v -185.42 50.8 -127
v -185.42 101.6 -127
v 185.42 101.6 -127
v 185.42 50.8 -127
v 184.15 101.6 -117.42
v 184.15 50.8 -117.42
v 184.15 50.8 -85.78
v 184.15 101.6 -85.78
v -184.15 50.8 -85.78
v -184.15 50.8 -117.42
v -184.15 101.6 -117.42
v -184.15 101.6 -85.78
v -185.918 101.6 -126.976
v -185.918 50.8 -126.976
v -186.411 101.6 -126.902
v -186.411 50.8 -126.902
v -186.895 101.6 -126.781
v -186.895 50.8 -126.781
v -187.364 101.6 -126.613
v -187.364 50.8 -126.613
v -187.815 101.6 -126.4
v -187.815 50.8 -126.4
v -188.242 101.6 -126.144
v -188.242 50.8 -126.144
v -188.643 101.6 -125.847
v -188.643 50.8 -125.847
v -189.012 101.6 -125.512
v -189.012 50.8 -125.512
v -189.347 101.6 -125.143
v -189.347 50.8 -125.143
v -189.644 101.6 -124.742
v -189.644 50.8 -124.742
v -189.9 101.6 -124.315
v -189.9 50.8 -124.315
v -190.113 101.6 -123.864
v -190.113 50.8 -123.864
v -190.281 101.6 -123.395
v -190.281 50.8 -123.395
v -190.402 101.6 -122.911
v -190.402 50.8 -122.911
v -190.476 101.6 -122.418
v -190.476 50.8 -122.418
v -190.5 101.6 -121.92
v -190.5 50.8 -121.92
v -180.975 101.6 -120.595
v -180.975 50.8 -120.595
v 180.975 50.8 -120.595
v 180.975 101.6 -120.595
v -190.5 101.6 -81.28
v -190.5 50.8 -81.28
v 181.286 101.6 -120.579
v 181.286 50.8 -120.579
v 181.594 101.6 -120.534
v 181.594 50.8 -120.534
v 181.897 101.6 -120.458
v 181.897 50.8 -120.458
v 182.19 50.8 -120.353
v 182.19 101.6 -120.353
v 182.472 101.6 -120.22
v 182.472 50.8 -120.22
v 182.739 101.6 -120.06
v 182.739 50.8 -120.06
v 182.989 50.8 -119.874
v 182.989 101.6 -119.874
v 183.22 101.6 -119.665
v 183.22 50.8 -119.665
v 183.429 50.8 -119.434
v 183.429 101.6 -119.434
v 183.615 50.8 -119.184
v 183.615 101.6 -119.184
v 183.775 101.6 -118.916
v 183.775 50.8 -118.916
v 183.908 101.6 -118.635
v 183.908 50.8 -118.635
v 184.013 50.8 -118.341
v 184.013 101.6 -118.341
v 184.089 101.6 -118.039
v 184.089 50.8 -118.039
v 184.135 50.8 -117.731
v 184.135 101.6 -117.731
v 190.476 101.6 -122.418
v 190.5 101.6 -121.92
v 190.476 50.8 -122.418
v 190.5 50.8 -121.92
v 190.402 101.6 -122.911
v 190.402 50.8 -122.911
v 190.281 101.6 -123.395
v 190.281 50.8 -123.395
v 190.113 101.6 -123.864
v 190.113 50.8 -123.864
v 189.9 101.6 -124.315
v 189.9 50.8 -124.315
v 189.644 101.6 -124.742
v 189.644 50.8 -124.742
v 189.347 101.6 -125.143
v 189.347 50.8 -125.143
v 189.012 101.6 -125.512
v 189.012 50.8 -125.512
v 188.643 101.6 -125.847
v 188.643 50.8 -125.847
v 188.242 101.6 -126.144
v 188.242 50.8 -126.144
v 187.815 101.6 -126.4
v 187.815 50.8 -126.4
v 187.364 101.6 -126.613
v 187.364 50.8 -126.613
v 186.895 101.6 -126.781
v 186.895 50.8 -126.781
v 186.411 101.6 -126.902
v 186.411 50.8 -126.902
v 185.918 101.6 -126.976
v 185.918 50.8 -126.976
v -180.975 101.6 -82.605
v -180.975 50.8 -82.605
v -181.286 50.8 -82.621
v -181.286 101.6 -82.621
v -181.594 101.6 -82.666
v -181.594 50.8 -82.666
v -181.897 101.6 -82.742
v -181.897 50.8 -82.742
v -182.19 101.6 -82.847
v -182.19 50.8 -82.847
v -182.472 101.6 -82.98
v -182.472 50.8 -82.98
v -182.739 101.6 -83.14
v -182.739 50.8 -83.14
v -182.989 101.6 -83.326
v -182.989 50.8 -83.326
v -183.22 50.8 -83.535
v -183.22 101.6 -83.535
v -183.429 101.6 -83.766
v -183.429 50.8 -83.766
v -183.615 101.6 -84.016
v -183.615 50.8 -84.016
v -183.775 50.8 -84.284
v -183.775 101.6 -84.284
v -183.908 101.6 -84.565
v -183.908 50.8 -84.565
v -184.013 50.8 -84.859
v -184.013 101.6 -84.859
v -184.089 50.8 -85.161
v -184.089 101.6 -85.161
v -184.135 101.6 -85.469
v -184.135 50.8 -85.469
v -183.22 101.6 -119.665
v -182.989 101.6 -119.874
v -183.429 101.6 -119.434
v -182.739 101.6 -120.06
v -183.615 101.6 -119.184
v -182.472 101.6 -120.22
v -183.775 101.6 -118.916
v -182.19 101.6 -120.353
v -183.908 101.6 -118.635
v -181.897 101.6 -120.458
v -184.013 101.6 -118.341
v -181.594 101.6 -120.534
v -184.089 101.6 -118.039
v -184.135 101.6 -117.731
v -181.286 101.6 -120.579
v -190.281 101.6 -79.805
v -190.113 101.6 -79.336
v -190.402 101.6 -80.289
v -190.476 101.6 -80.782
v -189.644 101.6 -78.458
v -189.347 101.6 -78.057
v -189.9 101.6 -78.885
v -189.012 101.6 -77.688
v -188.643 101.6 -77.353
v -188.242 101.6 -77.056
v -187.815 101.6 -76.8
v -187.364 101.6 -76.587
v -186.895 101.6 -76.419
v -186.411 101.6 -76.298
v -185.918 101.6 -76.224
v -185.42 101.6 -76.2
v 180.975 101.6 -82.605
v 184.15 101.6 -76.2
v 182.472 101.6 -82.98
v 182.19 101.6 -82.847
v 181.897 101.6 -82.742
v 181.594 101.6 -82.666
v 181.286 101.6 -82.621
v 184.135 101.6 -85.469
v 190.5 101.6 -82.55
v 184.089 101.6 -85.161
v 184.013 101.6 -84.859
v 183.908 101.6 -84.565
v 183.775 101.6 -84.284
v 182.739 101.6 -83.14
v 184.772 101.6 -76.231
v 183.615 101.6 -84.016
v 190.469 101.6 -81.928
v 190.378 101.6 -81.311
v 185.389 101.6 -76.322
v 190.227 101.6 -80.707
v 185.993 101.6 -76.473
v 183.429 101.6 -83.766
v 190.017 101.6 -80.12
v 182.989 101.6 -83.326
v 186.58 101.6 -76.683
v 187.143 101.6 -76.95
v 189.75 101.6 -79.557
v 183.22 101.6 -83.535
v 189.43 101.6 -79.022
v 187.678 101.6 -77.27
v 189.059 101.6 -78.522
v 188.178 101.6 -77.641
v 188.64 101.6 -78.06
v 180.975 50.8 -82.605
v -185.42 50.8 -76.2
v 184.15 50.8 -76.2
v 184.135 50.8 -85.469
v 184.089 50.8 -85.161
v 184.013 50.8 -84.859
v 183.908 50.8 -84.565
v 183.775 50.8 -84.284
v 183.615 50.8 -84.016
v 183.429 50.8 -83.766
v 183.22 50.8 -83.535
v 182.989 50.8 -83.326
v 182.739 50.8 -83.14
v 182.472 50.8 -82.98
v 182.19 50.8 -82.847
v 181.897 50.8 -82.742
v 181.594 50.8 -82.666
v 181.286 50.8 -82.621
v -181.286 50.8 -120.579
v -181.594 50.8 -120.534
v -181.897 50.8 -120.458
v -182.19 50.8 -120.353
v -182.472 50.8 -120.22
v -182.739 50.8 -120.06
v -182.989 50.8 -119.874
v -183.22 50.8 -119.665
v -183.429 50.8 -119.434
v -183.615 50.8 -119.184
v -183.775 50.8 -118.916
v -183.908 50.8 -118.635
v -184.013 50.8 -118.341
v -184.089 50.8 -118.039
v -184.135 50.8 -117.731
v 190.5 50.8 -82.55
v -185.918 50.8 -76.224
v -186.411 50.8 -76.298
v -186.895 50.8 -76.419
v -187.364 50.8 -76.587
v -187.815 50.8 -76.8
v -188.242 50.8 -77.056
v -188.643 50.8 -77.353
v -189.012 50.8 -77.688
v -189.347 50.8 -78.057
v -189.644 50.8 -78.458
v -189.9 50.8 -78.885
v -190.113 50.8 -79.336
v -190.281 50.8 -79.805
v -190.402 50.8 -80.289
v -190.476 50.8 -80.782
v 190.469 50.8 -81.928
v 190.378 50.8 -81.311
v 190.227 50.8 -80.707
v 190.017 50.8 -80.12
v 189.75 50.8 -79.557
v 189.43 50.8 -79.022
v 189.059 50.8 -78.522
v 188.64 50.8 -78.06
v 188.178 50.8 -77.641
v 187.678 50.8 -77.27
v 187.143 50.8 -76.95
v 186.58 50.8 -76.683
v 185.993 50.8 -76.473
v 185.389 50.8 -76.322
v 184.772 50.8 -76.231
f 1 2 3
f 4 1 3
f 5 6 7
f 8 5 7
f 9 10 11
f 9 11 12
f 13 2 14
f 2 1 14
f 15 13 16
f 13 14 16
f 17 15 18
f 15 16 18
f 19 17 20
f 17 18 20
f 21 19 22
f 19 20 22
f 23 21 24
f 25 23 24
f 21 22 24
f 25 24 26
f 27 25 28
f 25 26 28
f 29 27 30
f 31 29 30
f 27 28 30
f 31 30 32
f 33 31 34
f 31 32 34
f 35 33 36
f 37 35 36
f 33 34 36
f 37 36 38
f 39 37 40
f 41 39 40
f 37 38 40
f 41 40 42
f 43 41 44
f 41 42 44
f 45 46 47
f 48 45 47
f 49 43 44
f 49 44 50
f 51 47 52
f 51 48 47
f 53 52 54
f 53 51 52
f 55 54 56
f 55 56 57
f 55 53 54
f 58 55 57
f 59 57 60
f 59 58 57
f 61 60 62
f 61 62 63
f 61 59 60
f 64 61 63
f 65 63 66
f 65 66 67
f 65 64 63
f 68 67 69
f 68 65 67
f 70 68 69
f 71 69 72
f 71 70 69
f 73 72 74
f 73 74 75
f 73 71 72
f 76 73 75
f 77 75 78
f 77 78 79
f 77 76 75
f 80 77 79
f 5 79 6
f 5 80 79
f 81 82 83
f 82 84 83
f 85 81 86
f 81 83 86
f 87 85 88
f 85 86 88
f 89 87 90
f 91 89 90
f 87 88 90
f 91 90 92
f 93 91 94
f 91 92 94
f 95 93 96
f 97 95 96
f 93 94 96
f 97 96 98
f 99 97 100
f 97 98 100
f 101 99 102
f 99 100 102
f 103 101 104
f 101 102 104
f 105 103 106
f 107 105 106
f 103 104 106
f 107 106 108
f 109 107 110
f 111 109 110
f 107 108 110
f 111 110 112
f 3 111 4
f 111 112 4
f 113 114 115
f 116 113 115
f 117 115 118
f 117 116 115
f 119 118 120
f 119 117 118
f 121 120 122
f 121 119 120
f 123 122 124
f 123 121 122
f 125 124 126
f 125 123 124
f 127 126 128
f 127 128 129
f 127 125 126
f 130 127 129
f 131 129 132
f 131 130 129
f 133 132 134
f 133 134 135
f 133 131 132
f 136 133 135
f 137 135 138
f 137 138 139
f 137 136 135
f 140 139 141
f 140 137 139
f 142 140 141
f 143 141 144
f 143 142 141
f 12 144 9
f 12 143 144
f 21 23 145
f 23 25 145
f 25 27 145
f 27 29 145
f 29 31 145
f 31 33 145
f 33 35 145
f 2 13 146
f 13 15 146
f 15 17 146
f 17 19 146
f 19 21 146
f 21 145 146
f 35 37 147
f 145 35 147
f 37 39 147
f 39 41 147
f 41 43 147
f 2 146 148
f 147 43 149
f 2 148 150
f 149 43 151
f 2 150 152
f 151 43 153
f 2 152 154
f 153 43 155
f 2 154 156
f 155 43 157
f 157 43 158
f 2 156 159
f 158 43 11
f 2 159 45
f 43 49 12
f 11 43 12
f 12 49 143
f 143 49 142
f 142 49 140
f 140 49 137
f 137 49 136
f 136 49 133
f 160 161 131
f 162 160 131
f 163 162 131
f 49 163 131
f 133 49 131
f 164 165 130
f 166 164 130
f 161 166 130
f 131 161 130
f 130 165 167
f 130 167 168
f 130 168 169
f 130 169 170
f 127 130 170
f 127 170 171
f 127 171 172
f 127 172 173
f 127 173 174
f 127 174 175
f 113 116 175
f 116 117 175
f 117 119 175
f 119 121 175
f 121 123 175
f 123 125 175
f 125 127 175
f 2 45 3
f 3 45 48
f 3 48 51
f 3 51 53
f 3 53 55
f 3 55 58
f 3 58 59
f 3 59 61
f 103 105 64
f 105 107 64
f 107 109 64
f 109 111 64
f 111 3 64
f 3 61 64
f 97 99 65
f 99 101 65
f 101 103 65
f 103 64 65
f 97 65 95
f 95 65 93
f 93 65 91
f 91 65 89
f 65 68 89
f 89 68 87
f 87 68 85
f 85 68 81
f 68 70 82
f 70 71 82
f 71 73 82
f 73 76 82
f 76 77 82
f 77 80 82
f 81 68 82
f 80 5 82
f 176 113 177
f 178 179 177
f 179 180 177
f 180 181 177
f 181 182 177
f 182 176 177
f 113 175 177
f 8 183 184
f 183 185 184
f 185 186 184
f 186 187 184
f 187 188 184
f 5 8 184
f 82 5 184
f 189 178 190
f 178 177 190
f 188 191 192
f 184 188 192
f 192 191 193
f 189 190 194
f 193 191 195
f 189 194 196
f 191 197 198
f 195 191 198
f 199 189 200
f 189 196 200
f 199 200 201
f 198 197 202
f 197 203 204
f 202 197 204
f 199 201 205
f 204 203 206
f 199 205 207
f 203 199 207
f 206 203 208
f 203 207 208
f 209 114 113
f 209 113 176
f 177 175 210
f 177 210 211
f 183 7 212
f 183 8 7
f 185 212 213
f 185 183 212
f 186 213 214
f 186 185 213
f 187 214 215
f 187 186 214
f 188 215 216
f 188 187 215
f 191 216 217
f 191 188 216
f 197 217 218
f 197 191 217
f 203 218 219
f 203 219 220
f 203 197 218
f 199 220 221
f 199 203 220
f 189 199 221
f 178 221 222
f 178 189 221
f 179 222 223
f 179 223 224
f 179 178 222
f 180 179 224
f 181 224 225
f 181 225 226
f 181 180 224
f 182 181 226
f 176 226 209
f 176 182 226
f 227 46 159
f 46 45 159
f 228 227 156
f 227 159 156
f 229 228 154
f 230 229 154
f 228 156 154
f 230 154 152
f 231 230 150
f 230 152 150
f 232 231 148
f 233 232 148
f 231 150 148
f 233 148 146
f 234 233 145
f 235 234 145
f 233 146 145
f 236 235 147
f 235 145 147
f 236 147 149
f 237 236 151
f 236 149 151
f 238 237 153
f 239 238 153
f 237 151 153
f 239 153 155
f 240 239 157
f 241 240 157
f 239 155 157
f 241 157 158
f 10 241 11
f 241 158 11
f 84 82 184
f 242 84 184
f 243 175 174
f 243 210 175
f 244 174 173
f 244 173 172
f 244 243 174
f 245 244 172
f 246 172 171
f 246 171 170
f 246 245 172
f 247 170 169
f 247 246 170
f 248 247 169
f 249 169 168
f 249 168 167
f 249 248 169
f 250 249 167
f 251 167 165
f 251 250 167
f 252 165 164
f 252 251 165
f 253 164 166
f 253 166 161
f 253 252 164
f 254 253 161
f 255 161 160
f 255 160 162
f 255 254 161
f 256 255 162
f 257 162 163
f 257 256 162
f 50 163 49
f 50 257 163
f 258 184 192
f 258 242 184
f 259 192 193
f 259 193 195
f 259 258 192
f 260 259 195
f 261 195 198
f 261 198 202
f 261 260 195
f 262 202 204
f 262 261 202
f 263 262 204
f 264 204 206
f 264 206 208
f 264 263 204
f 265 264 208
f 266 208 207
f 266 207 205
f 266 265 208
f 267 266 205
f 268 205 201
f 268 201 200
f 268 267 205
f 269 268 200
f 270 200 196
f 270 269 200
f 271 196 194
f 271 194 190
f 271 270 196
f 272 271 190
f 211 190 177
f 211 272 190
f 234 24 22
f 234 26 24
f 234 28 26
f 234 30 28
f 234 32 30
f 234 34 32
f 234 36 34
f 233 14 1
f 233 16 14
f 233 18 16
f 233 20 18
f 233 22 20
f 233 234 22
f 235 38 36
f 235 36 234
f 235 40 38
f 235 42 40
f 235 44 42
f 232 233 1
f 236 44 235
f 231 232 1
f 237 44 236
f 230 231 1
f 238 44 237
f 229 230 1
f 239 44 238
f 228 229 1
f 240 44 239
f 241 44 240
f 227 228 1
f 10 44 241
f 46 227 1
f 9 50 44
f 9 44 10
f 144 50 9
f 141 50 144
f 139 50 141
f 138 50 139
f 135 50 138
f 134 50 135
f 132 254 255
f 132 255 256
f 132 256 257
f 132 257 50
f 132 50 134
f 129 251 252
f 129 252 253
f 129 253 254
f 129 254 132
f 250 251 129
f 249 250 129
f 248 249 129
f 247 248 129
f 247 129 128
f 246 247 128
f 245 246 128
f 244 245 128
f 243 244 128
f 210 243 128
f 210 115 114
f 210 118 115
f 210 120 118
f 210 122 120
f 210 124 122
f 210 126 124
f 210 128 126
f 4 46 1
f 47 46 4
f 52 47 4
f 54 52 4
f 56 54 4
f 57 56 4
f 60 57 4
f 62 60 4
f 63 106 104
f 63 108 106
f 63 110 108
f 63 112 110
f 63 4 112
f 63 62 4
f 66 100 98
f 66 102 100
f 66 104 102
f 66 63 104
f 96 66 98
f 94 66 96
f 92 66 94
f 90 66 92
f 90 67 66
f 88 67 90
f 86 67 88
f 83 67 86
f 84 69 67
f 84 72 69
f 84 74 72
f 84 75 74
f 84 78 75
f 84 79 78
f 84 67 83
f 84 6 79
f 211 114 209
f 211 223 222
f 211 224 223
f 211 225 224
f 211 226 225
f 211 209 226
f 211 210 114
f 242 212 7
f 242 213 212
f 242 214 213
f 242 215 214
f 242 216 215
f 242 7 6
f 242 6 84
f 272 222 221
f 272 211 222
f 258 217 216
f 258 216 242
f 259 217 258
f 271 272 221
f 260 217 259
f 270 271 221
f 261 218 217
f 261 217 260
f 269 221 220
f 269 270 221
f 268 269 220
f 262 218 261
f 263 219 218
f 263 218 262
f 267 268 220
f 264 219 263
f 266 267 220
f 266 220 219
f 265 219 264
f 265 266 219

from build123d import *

# Parameters (mm, degrees)
F0_W     = 381
F0_H     = 50.8
F1_DEPTH = 50.8
F2_R     = 6.35
F3_R     = 5.08
F5_W     = 368.3
F5_H     = 37.989244
F6_DEPTH = 50.8
F7_R     = 3.175


with BuildPart() as f1:
    # F0 (on Front) → F1 (new body)
    with BuildSketch(Plane.XZ):
        Rectangle(F0_W, F0_H)
    extrude(amount=F1_DEPTH)

    # F2
    f2_edges = [f1.edges().sort_by_distance(p)[0] for p in [
        (190.5, -25.4, 25.4),
    ]]
    fillet(f2_edges, radius=F2_R)

    # F3
    f3_edges = [f1.edges().sort_by_distance(p)[0] for p in [
        (190.5, -25.4, -25.4),
        (-190.5, -25.4, 25.4),
        (-190.5, -25.4, -25.4),
    ]]
    fillet(f3_edges, radius=F3_R)


with BuildPart() as f1_1:
    # F4: moved
    add(f1.part.moved(Location((0, 50.8, 0))))

    # F5 (on Front) → F6 (cut)
    with BuildSketch(Plane.XZ):
        Rectangle(F5_W, F5_H)
    extrude(amount=-F6_DEPTH, mode=Mode.SUBTRACT)

    # F7
    f7_edges = [f1_1.edges().sort_by_distance(p)[0] for p in [
        (184.15, 25.4, -18.994622),
        (184.15, 25.4, 18.994622),
        (-184.15, 25.4, 18.994622),
        (-184.15, 25.4, -18.994622),
    ]]
    fillet(f7_edges, radius=F7_R)


with BuildPart() as f1_2:
    # F8: moved
    add(f1_1.part.moved(Location((0, 50.8, 0))))


with BuildPart() as f1_3:
    # F9: moved
    add(f1_2.part.moved(Location((0, 0, -101.6))))


solid = f1_3.part
